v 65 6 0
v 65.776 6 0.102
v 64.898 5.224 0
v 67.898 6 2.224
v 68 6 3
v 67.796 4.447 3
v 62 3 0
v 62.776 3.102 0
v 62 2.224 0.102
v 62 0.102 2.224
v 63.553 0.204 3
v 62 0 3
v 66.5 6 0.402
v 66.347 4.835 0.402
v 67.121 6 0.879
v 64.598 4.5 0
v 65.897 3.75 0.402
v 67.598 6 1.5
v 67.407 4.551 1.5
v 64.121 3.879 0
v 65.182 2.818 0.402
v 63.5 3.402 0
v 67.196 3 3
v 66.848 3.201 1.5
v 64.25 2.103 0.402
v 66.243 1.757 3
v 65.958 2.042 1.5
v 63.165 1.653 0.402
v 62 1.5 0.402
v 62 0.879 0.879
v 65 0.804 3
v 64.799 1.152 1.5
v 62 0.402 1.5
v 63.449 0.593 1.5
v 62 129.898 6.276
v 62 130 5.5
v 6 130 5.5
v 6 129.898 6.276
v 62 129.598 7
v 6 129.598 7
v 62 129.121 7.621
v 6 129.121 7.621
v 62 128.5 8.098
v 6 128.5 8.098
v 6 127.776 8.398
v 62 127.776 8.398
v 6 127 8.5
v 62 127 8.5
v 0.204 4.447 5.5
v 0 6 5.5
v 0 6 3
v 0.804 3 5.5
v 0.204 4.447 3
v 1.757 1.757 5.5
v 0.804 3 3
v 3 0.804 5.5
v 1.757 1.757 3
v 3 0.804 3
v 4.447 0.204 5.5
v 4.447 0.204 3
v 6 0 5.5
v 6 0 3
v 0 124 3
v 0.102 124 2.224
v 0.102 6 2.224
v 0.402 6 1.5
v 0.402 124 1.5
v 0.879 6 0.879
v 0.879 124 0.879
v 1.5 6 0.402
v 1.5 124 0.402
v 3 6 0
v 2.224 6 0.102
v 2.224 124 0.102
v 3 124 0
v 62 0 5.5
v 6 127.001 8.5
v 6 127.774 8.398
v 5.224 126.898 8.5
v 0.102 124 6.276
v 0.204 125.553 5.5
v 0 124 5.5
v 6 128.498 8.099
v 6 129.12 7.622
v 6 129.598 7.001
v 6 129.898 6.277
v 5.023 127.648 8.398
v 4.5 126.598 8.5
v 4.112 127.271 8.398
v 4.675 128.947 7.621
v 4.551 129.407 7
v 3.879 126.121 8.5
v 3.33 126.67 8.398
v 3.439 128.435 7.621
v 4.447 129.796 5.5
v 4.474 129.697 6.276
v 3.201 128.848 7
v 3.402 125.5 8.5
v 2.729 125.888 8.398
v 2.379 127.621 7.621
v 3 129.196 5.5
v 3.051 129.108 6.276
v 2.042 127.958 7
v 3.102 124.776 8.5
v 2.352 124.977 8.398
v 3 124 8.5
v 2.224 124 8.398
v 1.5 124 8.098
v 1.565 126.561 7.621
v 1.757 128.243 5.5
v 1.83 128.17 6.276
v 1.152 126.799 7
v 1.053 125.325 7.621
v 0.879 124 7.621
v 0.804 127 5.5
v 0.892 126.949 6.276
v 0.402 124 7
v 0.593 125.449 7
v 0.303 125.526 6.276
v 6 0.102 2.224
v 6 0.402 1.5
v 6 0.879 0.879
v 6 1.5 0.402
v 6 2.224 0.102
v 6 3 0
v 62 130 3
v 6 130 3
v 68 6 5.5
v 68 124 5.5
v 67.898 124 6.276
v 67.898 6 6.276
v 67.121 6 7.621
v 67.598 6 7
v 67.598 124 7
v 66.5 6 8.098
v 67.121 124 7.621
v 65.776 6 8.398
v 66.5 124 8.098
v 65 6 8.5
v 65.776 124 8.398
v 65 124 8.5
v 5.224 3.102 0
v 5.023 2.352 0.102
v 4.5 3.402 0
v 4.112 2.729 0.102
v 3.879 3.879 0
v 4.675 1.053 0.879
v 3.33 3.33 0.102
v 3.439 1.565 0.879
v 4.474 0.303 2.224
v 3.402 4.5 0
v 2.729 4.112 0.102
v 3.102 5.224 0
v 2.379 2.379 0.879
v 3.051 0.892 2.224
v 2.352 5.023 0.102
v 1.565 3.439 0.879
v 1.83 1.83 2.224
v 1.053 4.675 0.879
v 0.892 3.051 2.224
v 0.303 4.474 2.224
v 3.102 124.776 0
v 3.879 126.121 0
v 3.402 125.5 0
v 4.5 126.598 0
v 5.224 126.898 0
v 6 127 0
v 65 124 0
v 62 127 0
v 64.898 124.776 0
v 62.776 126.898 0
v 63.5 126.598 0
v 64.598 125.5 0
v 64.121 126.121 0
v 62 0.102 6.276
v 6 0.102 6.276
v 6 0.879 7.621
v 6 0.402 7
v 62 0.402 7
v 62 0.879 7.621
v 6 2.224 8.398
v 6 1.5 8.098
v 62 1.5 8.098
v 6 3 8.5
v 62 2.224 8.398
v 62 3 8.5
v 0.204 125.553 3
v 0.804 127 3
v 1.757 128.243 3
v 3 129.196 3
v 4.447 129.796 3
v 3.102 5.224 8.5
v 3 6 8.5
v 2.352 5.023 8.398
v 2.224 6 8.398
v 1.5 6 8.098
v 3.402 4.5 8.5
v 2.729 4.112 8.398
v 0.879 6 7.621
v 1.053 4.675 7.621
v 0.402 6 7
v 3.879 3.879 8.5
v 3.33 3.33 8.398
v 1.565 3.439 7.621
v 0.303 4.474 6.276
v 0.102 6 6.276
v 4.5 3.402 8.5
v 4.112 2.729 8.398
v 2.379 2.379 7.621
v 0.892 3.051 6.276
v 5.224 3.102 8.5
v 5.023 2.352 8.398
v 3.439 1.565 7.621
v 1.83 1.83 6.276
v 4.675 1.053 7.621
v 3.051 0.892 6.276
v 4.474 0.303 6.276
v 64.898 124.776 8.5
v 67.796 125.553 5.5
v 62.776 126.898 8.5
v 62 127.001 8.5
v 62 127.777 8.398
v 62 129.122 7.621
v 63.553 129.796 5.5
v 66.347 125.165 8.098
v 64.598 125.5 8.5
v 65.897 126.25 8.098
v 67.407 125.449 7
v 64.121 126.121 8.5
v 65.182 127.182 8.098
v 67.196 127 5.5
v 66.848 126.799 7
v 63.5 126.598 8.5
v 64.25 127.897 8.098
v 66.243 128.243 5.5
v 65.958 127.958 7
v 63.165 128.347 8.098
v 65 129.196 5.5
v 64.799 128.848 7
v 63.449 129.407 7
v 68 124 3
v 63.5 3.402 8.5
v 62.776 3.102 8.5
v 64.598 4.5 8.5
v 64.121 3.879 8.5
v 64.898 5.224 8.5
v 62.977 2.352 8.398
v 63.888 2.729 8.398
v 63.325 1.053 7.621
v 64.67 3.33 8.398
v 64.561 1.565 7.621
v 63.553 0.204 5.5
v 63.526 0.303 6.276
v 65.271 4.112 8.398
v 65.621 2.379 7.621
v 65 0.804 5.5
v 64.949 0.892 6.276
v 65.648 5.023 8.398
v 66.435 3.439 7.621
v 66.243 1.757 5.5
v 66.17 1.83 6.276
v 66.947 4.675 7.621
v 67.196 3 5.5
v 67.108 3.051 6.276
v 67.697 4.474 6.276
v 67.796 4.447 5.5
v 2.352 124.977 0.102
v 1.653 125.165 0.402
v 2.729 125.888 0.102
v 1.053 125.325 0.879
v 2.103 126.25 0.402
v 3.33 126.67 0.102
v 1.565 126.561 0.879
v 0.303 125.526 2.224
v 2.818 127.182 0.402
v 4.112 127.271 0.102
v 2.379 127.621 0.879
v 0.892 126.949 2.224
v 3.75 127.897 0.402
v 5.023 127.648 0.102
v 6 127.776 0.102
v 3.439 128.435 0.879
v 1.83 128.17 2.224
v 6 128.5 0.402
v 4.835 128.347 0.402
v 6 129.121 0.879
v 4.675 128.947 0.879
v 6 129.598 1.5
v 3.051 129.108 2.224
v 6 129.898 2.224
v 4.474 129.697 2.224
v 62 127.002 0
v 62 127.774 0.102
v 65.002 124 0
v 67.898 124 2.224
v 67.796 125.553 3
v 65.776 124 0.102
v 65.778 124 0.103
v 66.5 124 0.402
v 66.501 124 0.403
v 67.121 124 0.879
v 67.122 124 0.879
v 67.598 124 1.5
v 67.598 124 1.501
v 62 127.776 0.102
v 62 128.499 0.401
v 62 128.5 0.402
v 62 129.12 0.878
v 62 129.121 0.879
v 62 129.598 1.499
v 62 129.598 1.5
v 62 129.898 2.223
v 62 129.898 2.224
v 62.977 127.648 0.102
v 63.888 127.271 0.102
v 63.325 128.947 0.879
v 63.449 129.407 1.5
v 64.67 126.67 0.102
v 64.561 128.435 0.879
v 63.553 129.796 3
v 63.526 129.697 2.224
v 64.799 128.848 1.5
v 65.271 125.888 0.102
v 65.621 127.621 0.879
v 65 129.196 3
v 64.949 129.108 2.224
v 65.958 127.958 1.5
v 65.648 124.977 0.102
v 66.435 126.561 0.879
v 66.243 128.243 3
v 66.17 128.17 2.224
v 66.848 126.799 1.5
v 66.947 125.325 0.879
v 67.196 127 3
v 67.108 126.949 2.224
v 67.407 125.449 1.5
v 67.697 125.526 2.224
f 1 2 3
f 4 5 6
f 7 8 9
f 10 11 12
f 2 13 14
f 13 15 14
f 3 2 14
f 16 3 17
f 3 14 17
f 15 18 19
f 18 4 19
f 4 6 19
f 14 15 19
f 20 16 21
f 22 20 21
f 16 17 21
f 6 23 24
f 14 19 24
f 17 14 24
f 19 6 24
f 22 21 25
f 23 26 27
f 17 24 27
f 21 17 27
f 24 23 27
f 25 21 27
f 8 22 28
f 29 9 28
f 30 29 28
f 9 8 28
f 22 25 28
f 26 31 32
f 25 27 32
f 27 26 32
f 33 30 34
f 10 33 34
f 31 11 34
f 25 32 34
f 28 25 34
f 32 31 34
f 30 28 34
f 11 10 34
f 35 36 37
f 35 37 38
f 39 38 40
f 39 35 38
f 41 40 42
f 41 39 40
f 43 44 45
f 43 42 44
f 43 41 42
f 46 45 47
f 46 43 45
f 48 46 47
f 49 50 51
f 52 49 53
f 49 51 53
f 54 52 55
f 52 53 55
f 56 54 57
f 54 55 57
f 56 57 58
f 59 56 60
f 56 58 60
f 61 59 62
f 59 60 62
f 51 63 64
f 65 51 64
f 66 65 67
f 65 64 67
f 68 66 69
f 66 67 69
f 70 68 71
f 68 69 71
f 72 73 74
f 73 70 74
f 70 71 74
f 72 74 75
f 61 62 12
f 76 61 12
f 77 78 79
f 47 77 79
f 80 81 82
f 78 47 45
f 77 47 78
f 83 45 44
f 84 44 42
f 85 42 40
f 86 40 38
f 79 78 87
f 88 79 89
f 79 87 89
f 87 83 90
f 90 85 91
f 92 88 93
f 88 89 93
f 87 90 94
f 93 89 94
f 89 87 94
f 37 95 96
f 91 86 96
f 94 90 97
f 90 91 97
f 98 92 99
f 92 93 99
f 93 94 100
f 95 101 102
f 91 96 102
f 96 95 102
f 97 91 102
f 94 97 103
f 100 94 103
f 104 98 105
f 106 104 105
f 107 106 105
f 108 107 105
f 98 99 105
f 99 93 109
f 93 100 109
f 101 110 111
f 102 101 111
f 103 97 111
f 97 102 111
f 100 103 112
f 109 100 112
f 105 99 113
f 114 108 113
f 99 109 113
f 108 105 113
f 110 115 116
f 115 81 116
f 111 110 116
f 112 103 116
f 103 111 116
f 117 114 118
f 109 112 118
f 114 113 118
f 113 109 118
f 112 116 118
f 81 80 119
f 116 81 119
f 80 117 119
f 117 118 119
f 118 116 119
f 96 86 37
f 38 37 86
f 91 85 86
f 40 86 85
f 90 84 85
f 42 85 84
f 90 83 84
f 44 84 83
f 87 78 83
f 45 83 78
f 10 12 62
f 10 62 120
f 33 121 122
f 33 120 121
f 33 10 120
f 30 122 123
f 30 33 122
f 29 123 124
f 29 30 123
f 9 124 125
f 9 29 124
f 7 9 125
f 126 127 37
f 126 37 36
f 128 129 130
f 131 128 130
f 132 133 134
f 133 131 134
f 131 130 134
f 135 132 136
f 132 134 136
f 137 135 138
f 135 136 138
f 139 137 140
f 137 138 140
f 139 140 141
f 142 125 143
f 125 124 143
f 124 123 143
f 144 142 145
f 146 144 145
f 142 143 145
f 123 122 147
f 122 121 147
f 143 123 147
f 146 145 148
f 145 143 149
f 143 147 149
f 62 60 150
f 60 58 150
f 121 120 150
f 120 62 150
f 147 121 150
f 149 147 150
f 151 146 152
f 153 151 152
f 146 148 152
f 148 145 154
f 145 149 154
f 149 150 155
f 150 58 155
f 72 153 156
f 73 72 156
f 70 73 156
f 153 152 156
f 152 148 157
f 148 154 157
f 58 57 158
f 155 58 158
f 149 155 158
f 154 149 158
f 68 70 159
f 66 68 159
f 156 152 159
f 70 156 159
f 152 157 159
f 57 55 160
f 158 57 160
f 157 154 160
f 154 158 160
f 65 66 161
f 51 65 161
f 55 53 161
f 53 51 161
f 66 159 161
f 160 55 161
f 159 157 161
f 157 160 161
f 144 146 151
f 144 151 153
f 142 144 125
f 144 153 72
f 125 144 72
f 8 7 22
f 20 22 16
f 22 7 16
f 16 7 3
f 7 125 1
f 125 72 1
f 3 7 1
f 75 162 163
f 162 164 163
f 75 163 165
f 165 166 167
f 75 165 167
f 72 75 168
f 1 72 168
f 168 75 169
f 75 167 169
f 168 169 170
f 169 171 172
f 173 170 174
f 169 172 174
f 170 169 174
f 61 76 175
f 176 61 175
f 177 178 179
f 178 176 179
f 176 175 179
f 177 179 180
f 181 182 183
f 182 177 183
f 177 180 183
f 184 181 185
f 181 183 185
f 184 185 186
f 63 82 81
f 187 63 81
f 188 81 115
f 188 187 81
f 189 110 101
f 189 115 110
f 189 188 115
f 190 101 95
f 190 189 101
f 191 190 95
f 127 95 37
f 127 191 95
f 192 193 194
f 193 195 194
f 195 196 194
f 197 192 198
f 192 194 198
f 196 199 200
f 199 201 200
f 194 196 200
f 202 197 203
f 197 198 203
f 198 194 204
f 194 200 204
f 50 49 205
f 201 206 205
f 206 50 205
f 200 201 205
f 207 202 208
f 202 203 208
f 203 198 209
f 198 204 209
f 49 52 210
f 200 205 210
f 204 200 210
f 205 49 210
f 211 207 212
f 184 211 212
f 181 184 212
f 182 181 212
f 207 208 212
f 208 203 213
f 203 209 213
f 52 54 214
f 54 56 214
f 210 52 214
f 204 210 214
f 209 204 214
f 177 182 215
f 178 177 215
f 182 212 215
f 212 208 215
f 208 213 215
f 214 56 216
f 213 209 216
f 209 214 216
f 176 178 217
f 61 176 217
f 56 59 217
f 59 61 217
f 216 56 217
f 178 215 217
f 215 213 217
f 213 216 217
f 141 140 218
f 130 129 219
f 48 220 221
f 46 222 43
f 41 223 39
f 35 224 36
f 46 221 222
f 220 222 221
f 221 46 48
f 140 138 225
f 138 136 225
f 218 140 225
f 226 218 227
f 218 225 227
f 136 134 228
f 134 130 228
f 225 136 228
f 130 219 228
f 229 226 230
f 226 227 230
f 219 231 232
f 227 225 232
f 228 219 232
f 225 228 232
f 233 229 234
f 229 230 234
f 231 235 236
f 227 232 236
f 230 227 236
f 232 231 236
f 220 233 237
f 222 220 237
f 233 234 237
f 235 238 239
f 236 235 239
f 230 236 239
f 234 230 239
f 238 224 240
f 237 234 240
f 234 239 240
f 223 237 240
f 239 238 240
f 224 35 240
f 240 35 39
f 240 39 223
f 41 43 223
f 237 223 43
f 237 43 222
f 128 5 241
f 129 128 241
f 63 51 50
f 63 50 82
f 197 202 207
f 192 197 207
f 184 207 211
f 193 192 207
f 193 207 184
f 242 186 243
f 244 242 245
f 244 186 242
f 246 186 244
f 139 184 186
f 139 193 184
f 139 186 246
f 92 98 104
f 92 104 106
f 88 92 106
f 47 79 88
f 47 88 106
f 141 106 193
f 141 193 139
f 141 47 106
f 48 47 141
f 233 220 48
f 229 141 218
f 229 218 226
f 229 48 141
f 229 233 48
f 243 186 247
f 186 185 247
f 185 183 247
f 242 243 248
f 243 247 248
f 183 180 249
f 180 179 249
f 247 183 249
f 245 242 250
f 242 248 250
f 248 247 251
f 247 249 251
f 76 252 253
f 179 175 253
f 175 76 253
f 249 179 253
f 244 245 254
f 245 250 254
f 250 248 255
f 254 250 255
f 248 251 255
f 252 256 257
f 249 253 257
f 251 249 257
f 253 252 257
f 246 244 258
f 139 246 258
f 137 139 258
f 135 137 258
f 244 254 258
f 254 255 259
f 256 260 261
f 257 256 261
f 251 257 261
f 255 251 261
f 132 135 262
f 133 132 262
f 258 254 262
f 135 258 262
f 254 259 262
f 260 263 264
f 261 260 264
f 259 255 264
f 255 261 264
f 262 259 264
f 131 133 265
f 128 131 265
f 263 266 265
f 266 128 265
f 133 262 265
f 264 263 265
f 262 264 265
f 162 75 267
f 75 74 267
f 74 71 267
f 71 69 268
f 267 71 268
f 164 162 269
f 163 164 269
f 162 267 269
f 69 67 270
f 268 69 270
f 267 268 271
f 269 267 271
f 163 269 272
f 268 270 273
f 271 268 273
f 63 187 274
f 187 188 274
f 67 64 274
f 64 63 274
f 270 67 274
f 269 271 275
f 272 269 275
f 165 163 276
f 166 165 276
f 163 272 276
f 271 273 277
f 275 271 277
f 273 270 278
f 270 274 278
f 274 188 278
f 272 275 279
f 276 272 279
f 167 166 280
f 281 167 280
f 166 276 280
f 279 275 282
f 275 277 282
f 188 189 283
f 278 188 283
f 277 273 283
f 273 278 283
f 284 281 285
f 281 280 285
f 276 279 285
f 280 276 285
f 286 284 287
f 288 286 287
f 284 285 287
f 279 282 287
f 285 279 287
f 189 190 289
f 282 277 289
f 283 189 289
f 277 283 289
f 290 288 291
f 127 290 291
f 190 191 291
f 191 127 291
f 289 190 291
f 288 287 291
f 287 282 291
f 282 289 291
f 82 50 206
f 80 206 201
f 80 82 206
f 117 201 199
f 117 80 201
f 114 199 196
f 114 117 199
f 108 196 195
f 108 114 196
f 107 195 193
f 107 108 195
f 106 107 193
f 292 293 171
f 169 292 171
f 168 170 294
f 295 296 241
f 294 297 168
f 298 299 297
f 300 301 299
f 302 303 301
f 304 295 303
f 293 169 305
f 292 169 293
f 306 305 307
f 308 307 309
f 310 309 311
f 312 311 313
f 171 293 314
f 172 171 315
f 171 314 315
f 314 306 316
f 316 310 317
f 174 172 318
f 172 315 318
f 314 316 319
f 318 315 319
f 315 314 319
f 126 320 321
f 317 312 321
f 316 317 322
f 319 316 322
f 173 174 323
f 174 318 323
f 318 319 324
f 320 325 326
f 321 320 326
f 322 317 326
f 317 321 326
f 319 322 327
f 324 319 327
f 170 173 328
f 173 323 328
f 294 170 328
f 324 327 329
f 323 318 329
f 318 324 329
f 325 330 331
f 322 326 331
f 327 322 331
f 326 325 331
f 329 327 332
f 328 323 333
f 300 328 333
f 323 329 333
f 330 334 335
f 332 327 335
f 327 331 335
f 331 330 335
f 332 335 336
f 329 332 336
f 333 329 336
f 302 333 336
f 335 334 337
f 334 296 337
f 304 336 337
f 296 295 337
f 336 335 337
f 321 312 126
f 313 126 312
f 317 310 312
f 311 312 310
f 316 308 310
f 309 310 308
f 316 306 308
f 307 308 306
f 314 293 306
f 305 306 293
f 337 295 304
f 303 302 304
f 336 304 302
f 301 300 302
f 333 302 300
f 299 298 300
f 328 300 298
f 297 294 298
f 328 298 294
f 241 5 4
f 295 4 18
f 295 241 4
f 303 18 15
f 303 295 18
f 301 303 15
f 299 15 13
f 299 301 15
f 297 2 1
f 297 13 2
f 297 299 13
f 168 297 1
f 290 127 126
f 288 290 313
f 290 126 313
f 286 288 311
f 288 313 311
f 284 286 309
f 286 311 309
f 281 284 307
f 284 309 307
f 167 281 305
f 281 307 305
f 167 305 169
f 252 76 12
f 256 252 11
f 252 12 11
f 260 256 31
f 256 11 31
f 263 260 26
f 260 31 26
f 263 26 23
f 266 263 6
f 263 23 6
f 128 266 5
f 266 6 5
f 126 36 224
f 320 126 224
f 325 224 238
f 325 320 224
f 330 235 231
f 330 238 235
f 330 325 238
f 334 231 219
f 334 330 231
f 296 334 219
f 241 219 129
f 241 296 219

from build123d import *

# Parameters (mm, degrees)
F0_W         = 68
F0_H         = 130
F1_DEPTH     = 8.5
F2_R         = 3
F3_T1_DEPTH  = 8.5
F3_T4_ANGLE  = 90
F3_T6_ANGLE  = 90
F3_T8_ANGLE  = 90
F3_T10_ANGLE = 90
F3_T12_ANGLE = 90
F3_T14_ANGLE = 90
F3_T16_ANGLE = 90
F3_T18_ANGLE = 90


# Not quite as in the source:
# - a fillet or chamfer that OpenCascade refuses, or shapes differently, is made with other operations: its cross-section is extruded or revolved along the edge and cut away or added


with BuildPart() as f1:
    # F0 (on Top) → F1 (new body)
    with BuildSketch(Plane.XY):
        with Locations((34, 65)):
            Rectangle(F0_W, F0_H)
    extrude(amount=F1_DEPTH)

    # F2
    f2_edges = [f1.edges().sort_by_distance(p)[0] for p in [
        (0, 65, 8.5),
        (0, 65, 0),
        (68, 65, 8.5),
        (68, 65, 0),
        (34, 0, 0),
        (34, 0, 8.5),
        (34, 130, 8.5),
        (34, 130, 0),
    ]]
    fillet(f2_edges, radius=F2_R)

    # F3: fillet of radius 6 on 4 edges, made by hand

    # F3_s2 → F3_t1 (cut)
    with BuildSketch(Plane.XY):
        with BuildLine():
            ThreePointArc((0, 6), (1.7573593129, 1.7573593129), (6, 0))
            Line((6, 0), (0, 0))
            Line((0, 0), (0, 6))
        make_face()
        with BuildLine():
            ThreePointArc((62, 0), (66.2426406871, 1.7573593129), (68, 6))
            Line((68, 6), (68, 0))
            Line((68, 0), (62, 0))
        make_face()
        with BuildLine():
            ThreePointArc((62, 130), (66.2426406871, 128.2426406871), (68, 124))
            Line((68, 124), (68, 130))
            Line((68, 130), (62, 130))
        make_face()
        with BuildLine():
            ThreePointArc((0, 124), (1.7573593129, 128.2426406871), (6, 130))
            Line((6, 130), (0, 130))
            Line((0, 130), (0, 124))
        make_face()
    extrude(amount=F3_T1_DEPTH, mode=Mode.SUBTRACT)

    # F3_s3 → F3_t4 (revolve, cut)
    with BuildSketch(Plane.XZ.offset(-124)):
        with BuildLine():
            ThreePointArc((3, 0), (0.8786796564, 0.8786796564), (0, 3))
            Line((0, 3), (0, 0))
            Line((0, 0), (3, 0))
        make_face()
    revolve(axis=Axis((6, 124, 0), (0, 0, -1)), revolution_arc=F3_T4_ANGLE, mode=Mode.SUBTRACT)

    # F3_s5 → F3_t6 (revolve, cut)
    with BuildSketch(Plane.YZ.offset(6)):
        with BuildLine():
            ThreePointArc((127, 8.5), (129.1213203436, 7.6213203436), (130, 5.5))
            Line((130, 5.5), (130, 8.5))
            Line((130, 8.5), (127, 8.5))
        make_face()
    revolve(axis=Axis((6, 124, 8.5), (0, 0, 1)), revolution_arc=F3_T6_ANGLE, mode=Mode.SUBTRACT)

    # F3_s7 → F3_t8 (revolve, cut)
    with BuildSketch(Plane.YZ.offset(62)):
        with BuildLine():
            ThreePointArc((127, 0), (129.1213203436, 0.8786796564), (130, 3))
            Line((130, 3), (130, 0))
            Line((130, 0), (127, 0))
        make_face()
    revolve(axis=Axis((62, 124, 0), (0, 0, -1)), revolution_arc=F3_T8_ANGLE, mode=Mode.SUBTRACT)

    # F3_s9 → F3_t10 (revolve, cut)
    with BuildSketch(Plane.XZ.offset(-124)):
        with BuildLine():
            ThreePointArc((65, 8.5), (67.1213203436, 7.6213203436), (68, 5.5))
            Line((68, 5.5), (68, 8.5))
            Line((68, 8.5), (65, 8.5))
        make_face()
    revolve(axis=Axis((62, 124, 8.5), (0, 0, 1)), revolution_arc=F3_T10_ANGLE, mode=Mode.SUBTRACT)

    # F3_s11 → F3_t12 (revolve, cut)
    with BuildSketch(Plane.XZ.offset(-6)):
        with BuildLine():
            ThreePointArc((65, 0), (67.1213203436, 0.8786796564), (68, 3))
            Line((68, 3), (68, 0))
            Line((68, 0), (65, 0))
        make_face()
    revolve(axis=Axis((62, 6, 0), (0, 0, -1)), revolution_arc=F3_T12_ANGLE, mode=Mode.SUBTRACT)

    # F3_s13 → F3_t14 (revolve, cut)
    with BuildSketch(Plane.YZ.offset(62)):
        with BuildLine():
            ThreePointArc((3, 8.5), (0.8786796564, 7.6213203436), (0, 5.5))
            Line((0, 5.5), (0, 8.5))
            Line((0, 8.5), (3, 8.5))
        make_face()
    revolve(axis=Axis((62, 6, 8.5), (0, 0, 1)), revolution_arc=F3_T14_ANGLE, mode=Mode.SUBTRACT)

    # F3_s15 → F3_t16 (revolve, cut)
    with BuildSketch(Plane.YZ.offset(6)):
        with BuildLine():
            ThreePointArc((3, 0), (0.8786796564, 0.8786796564), (0, 3))
            Line((0, 3), (0, 0))
            Line((0, 0), (3, 0))
        make_face()
    revolve(axis=Axis((6, 6, 0), (0, 0, -1)), revolution_arc=F3_T16_ANGLE, mode=Mode.SUBTRACT)

    # F3_s17 → F3_t18 (revolve, cut)
    with BuildSketch(Plane.XZ.offset(-6)):
        with BuildLine():
            ThreePointArc((3, 8.5), (0.8786796564, 7.6213203436), (0, 5.5))
            Line((0, 5.5), (0, 8.5))
            Line((0, 8.5), (3, 8.5))
        make_face()
    revolve(axis=Axis((6, 6, 8.5), (0, 0, 1)), revolution_arc=F3_T18_ANGLE, mode=Mode.SUBTRACT)


solid = f1.part
